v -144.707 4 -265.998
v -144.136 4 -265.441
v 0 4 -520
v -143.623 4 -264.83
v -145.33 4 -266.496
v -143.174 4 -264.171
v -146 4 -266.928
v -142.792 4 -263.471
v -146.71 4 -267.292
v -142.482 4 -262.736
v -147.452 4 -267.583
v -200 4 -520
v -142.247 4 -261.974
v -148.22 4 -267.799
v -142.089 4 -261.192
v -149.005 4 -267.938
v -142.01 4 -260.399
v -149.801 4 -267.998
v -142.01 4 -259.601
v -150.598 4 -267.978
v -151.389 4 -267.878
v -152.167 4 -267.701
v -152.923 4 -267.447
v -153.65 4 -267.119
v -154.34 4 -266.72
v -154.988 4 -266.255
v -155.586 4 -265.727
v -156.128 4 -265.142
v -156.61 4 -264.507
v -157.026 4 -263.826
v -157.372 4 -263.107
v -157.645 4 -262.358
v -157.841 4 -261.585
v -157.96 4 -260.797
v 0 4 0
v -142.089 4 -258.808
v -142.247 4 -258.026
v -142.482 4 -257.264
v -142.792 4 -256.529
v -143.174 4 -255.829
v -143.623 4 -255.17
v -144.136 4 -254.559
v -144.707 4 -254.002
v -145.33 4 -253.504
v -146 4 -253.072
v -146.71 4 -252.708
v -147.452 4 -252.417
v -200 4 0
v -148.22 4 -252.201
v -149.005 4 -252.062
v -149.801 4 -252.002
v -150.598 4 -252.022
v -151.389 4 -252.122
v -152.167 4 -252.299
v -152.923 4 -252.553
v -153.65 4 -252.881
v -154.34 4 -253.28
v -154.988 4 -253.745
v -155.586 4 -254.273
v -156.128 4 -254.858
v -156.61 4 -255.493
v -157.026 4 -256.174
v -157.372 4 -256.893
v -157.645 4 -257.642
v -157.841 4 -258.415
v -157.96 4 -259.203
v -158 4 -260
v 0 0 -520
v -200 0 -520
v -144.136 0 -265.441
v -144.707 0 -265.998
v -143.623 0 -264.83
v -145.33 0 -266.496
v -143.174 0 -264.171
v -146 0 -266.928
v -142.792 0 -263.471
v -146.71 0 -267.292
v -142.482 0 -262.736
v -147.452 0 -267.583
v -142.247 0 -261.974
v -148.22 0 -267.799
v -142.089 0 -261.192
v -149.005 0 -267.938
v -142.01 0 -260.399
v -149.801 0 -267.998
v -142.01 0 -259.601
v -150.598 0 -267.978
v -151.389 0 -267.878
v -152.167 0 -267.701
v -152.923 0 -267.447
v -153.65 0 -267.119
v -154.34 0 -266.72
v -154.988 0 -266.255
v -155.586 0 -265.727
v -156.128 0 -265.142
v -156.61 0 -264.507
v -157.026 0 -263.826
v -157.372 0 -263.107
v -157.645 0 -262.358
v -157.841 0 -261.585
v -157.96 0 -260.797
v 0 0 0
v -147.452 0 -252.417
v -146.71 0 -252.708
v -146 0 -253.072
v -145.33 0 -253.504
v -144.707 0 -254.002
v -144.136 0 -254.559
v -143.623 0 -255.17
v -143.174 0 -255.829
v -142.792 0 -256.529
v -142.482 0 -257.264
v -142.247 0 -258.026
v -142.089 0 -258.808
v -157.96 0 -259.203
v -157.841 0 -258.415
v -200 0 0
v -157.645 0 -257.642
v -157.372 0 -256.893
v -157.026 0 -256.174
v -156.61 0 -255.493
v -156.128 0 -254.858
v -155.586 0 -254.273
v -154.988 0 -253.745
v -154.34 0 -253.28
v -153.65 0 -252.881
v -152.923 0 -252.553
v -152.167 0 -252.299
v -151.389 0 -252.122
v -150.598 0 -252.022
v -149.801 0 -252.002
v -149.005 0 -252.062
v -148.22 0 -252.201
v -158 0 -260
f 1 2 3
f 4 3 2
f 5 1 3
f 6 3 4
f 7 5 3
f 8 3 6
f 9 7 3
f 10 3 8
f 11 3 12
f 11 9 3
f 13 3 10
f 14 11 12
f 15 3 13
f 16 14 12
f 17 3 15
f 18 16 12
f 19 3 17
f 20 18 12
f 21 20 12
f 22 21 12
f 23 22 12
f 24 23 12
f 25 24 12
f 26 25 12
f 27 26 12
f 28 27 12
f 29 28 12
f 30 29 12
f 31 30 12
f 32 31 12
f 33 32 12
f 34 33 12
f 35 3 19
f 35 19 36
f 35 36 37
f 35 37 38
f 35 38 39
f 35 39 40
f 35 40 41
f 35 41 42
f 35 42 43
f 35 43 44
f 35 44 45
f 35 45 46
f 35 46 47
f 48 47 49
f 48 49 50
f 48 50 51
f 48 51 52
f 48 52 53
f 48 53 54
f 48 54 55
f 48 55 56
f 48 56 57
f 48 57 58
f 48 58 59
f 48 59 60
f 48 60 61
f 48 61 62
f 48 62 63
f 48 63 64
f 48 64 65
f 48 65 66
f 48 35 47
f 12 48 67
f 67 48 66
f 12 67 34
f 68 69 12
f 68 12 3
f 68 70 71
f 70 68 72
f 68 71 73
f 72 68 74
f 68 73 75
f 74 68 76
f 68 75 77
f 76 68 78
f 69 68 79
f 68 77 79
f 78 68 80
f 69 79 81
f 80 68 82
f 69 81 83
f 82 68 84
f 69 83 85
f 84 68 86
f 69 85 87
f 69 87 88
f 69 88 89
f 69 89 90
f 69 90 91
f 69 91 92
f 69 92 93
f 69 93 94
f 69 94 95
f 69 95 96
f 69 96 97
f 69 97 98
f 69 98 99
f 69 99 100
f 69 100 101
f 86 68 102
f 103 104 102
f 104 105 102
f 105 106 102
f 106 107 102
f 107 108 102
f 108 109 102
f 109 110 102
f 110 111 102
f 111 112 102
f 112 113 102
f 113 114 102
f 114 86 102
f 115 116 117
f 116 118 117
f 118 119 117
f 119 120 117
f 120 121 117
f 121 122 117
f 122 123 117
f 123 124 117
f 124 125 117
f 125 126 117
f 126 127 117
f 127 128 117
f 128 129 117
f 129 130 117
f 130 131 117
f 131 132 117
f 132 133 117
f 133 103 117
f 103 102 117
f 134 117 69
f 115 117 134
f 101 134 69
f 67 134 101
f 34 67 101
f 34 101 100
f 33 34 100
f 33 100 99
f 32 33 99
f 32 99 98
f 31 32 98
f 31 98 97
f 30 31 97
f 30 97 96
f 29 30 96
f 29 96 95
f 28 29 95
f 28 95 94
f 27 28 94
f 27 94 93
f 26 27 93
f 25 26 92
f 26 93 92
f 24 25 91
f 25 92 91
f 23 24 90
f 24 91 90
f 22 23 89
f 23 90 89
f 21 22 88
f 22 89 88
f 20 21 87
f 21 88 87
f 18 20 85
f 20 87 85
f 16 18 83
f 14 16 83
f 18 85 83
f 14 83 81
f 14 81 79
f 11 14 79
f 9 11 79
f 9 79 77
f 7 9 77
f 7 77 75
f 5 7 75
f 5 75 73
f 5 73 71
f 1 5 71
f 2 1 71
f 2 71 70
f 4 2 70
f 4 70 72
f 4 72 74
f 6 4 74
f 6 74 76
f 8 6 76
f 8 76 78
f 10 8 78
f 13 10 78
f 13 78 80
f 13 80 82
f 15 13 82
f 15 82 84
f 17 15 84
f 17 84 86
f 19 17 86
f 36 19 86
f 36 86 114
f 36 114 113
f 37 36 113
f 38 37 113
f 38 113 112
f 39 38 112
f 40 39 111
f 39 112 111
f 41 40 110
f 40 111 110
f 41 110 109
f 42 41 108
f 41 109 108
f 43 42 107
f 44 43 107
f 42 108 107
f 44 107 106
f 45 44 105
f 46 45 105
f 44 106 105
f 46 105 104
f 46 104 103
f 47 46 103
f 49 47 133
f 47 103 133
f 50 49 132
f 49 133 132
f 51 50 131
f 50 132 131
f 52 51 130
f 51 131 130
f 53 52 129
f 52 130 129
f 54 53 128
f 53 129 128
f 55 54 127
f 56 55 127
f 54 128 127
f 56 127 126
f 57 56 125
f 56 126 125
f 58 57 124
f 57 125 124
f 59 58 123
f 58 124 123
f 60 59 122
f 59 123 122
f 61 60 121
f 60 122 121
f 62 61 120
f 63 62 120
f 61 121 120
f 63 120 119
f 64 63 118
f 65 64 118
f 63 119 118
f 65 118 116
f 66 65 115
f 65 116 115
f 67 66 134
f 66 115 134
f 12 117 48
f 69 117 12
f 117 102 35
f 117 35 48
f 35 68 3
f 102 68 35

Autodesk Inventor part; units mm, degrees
ref_plane "YZ Plane" through (0, 0, 0) normal (1, 0, 0) x (0, 1, 0)
ref_plane "XZ Plane" through (0, 0, 0) normal (0, 1, 0) x (-1, 0, 0)
ref_plane "XY Plane" through (0, 0, 0) normal (0, 0, 1) x (1, 0, 0)
sketch "Эскиз1" plane through (0, 0, 0) normal (0, 1, 0) x (-1, 0, 0)
  line L0 (0, 0) -> (200, 0)
  line L1 (200, 0) -> (200, -520)
  line L2 (200, -520) -> (0, -520)
  line L3 (0, -520) -> (0, 0)
  circle A0 centre (150, -260) radius 8
  line L4 (150, -260) -> (0, -260)
  line L5 (150, -260) -> (200, -260)
  dimension "d0" = 200
  dimension "d1" = 520
  dimension "d2" = 16
  dimension "d3" = 150
extrude "Выдавливание1" add sketch "Эскиз1" along normal blind 4 contours L0 L1 L5 A0 L4 L3 | L4 A0 L5 L1 L2 L3
properties part number "Стена 16 мм отверстие"
